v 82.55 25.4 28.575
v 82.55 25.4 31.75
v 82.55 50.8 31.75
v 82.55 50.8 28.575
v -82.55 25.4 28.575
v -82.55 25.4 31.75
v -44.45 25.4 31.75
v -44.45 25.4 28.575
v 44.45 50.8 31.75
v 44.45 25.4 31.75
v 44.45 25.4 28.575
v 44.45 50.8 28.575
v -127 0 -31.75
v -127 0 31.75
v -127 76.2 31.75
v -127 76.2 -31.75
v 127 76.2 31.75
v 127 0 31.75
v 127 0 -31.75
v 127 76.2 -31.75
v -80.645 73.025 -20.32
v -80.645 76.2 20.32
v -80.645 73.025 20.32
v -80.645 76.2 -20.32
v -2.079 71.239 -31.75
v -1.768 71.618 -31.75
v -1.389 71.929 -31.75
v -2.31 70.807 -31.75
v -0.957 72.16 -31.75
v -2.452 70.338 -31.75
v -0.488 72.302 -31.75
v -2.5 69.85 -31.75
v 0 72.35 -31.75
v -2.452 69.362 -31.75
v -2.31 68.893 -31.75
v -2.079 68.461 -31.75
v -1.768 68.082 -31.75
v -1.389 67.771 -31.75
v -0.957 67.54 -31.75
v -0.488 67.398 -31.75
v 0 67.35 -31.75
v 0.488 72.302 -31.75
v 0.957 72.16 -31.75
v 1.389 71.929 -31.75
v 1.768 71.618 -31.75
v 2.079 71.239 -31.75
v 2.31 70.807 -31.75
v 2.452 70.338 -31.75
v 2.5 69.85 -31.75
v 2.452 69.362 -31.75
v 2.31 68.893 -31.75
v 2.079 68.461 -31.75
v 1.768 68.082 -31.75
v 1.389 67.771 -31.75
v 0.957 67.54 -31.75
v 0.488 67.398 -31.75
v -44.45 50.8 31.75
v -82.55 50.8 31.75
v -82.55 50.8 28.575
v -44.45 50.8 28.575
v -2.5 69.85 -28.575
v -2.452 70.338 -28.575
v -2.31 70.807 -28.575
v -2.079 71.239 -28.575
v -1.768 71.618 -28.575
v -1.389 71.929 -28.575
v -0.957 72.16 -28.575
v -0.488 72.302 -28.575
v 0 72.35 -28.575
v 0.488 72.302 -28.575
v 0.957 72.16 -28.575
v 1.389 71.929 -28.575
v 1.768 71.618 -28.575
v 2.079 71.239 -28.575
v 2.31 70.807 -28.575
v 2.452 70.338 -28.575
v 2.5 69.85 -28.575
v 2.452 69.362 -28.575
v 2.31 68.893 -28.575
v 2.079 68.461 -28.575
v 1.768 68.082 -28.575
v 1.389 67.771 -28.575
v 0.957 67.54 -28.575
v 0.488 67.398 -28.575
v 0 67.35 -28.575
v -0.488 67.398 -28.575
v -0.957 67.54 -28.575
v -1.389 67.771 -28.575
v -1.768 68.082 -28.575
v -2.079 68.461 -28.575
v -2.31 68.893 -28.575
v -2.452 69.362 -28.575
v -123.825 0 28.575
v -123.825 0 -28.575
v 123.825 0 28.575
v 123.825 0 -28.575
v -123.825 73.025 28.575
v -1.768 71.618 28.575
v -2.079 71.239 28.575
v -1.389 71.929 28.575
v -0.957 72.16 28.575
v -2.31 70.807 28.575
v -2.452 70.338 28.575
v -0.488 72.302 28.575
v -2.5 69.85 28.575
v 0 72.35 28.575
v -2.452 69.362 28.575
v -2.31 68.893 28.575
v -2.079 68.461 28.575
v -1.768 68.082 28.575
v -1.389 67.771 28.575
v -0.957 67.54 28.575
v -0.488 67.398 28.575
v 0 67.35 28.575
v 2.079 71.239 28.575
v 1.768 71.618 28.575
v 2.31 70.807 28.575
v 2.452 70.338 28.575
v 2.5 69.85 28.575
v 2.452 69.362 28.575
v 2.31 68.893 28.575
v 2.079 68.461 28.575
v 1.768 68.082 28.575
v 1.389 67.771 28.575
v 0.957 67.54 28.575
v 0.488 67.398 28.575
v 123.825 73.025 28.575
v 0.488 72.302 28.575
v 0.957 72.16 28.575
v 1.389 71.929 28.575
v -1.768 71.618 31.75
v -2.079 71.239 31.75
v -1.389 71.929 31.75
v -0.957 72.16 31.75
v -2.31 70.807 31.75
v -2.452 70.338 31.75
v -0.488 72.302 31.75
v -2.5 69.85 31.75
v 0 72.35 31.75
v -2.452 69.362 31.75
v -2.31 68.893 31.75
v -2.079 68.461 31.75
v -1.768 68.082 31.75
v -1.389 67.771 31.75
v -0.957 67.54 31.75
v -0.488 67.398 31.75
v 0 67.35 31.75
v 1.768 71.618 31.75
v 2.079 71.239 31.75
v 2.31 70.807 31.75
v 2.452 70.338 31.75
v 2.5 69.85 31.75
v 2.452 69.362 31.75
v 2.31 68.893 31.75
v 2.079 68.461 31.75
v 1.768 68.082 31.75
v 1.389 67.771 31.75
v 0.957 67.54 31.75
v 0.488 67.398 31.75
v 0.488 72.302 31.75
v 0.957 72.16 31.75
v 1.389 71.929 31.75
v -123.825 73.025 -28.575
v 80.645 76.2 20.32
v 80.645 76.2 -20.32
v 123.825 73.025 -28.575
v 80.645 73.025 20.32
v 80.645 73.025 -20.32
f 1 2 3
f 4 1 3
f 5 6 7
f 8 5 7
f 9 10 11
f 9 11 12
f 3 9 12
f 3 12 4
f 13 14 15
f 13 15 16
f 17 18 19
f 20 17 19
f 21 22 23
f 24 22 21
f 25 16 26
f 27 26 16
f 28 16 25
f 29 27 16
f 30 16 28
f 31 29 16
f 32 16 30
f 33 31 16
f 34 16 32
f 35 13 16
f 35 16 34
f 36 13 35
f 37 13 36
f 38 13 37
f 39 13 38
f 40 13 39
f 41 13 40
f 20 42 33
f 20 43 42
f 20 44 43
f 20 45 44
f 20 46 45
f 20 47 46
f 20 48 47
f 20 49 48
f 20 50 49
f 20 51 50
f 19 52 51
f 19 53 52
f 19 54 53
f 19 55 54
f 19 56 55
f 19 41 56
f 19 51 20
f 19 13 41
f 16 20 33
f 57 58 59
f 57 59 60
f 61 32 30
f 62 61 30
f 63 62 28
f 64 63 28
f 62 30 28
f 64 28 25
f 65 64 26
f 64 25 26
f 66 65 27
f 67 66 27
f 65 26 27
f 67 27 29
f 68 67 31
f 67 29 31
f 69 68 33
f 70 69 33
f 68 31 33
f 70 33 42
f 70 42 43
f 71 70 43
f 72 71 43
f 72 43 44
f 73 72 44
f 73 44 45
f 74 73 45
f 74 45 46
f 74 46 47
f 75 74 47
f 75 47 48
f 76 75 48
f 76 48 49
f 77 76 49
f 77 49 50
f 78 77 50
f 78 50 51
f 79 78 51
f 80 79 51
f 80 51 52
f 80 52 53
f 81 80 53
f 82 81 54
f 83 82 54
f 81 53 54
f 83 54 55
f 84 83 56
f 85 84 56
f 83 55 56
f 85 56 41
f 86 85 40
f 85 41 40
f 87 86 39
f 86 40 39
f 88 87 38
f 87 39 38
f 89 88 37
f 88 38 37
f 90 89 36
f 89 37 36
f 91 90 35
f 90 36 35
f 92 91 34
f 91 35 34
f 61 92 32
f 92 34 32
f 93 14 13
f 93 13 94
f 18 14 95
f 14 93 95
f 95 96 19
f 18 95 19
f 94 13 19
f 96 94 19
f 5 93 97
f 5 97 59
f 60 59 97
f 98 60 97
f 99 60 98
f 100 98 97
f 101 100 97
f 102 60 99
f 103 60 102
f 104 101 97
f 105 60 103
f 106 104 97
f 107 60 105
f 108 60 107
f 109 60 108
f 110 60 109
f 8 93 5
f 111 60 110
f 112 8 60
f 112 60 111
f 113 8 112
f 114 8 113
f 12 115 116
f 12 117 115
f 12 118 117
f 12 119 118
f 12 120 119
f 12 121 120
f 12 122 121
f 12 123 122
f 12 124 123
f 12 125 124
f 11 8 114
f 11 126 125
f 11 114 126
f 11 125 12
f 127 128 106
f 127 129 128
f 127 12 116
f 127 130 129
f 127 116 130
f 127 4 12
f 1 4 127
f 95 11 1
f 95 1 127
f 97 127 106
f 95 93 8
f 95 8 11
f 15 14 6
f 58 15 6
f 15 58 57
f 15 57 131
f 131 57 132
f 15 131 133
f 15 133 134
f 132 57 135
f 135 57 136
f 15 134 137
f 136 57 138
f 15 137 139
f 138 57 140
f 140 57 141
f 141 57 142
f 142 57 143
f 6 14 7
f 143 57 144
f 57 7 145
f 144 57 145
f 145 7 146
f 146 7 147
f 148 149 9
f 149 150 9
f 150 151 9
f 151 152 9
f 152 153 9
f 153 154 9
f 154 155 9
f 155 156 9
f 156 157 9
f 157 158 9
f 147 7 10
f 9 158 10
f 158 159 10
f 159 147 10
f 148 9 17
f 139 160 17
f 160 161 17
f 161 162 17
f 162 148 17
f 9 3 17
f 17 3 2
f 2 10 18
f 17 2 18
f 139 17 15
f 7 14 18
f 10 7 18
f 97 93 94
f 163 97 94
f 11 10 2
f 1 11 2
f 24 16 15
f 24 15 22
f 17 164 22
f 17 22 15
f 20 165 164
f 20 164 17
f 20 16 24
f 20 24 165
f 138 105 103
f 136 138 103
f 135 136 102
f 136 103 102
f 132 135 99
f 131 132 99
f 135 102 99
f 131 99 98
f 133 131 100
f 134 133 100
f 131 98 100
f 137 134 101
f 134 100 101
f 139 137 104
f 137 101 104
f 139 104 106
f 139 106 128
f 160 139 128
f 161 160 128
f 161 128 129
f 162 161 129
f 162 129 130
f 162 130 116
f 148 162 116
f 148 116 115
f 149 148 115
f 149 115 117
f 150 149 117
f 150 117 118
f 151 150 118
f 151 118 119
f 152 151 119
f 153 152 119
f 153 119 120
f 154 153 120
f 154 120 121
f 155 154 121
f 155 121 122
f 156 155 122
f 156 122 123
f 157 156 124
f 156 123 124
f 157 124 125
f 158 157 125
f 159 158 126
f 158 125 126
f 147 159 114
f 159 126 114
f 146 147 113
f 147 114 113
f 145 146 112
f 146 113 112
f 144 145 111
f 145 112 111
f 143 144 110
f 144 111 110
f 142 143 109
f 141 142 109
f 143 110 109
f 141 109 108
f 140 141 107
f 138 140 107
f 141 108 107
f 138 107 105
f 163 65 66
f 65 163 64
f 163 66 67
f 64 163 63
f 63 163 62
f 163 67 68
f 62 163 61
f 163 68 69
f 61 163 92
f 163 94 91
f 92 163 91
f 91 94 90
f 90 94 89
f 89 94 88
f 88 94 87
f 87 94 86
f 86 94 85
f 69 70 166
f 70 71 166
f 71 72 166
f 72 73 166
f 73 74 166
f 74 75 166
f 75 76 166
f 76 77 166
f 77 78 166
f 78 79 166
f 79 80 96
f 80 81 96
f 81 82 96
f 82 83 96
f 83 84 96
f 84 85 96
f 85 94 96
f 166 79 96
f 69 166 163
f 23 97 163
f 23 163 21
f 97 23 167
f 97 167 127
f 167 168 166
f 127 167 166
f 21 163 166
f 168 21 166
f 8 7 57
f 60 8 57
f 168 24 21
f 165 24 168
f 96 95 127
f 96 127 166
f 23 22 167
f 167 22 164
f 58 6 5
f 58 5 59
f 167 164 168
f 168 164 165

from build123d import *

# Parameters (mm, degrees)
SKETCH1_W           = 254
SKETCH1_H           = 63.5
BOSS_EXTRUDE1_DEPTH = 76.2
SHELL1_T            = -3.175
CUT_EXTRUDE1_REACH  = 163.145
SKETCH2_W           = 38.1
SKETCH2_H           = 25.4
SKETCH3_R           = 2.5
CUT_EXTRUDE2_DEPTH  = 162.144934764
SKETCH4_W           = 161.29
SKETCH4_H           = 40.64
CUT_EXTRUDE3_DEPTH  = 152.471127612


with BuildPart() as part:
    # Sketch1 → Boss-Extrude1 (new body)
    with BuildSketch(Plane(origin=(0, 0, 0), x_dir=(1, 0, 0), z_dir=(0, 1, 0))):
        Rectangle(SKETCH1_W, SKETCH1_H)
    extrude(amount=BOSS_EXTRUDE1_DEPTH)

    # Shell1
    shell1_openings = [part.faces().sort_by_distance(p)[0] for p in [
        (0, 0, 0),
    ]]
    offset(amount=SHELL1_T, openings=shell1_openings, kind=Kind.INTERSECTION)

    # Sketch2 → Cut-Extrude1 (cut, up to next)
    with BuildSketch(Plane.XY.offset(31.75), mode=Mode.PRIVATE) as cut_extrude1_sk1:
        with Locations((63.5, 38.1)):
            Rectangle(SKETCH2_W, SKETCH2_H)
    cut_extrude1_tool1 = extrude(cut_extrude1_sk1.sketch, amount=-CUT_EXTRUDE1_REACH, mode=Mode.PRIVATE) & part.part
    # Sketch2 → Cut-Extrude1 (cut, up to next)
    with BuildSketch(Plane.XY.offset(31.75), mode=Mode.PRIVATE) as cut_extrude1_sk2:
        with Locations((-63.5, 38.1)):
            Rectangle(SKETCH2_W, SKETCH2_H)
    cut_extrude1_tool2 = extrude(cut_extrude1_sk2.sketch, amount=-CUT_EXTRUDE1_REACH, mode=Mode.PRIVATE) & part.part
    add(cut_extrude1_tool1.solids().sort_by_distance((63.5, 38.1, 31.75))[0], mode=Mode.SUBTRACT)
    add(cut_extrude1_tool2.solids().sort_by_distance((-63.5, 38.1, 31.75))[0], mode=Mode.SUBTRACT)

    # Sketch3 → Cut-Extrude2 (cut, through all)
    with BuildSketch(Plane(origin=(0, 0, -31.75), x_dir=(-1, 0, 0), z_dir=(0, 0, -1))):
        with Locations((0, 69.85)):
            Circle(SKETCH3_R)
    extrude(amount=-CUT_EXTRUDE2_DEPTH, mode=Mode.SUBTRACT)

    # Sketch4 → Cut-Extrude3 (cut, through all)
    with BuildSketch(Plane(origin=(0, 76.2, 0), x_dir=(1, 0, 0), z_dir=(0, 1, 0))):
        Rectangle(SKETCH4_W, SKETCH4_H)
    extrude(amount=-CUT_EXTRUDE3_DEPTH, mode=Mode.SUBTRACT)


solid = part.part
